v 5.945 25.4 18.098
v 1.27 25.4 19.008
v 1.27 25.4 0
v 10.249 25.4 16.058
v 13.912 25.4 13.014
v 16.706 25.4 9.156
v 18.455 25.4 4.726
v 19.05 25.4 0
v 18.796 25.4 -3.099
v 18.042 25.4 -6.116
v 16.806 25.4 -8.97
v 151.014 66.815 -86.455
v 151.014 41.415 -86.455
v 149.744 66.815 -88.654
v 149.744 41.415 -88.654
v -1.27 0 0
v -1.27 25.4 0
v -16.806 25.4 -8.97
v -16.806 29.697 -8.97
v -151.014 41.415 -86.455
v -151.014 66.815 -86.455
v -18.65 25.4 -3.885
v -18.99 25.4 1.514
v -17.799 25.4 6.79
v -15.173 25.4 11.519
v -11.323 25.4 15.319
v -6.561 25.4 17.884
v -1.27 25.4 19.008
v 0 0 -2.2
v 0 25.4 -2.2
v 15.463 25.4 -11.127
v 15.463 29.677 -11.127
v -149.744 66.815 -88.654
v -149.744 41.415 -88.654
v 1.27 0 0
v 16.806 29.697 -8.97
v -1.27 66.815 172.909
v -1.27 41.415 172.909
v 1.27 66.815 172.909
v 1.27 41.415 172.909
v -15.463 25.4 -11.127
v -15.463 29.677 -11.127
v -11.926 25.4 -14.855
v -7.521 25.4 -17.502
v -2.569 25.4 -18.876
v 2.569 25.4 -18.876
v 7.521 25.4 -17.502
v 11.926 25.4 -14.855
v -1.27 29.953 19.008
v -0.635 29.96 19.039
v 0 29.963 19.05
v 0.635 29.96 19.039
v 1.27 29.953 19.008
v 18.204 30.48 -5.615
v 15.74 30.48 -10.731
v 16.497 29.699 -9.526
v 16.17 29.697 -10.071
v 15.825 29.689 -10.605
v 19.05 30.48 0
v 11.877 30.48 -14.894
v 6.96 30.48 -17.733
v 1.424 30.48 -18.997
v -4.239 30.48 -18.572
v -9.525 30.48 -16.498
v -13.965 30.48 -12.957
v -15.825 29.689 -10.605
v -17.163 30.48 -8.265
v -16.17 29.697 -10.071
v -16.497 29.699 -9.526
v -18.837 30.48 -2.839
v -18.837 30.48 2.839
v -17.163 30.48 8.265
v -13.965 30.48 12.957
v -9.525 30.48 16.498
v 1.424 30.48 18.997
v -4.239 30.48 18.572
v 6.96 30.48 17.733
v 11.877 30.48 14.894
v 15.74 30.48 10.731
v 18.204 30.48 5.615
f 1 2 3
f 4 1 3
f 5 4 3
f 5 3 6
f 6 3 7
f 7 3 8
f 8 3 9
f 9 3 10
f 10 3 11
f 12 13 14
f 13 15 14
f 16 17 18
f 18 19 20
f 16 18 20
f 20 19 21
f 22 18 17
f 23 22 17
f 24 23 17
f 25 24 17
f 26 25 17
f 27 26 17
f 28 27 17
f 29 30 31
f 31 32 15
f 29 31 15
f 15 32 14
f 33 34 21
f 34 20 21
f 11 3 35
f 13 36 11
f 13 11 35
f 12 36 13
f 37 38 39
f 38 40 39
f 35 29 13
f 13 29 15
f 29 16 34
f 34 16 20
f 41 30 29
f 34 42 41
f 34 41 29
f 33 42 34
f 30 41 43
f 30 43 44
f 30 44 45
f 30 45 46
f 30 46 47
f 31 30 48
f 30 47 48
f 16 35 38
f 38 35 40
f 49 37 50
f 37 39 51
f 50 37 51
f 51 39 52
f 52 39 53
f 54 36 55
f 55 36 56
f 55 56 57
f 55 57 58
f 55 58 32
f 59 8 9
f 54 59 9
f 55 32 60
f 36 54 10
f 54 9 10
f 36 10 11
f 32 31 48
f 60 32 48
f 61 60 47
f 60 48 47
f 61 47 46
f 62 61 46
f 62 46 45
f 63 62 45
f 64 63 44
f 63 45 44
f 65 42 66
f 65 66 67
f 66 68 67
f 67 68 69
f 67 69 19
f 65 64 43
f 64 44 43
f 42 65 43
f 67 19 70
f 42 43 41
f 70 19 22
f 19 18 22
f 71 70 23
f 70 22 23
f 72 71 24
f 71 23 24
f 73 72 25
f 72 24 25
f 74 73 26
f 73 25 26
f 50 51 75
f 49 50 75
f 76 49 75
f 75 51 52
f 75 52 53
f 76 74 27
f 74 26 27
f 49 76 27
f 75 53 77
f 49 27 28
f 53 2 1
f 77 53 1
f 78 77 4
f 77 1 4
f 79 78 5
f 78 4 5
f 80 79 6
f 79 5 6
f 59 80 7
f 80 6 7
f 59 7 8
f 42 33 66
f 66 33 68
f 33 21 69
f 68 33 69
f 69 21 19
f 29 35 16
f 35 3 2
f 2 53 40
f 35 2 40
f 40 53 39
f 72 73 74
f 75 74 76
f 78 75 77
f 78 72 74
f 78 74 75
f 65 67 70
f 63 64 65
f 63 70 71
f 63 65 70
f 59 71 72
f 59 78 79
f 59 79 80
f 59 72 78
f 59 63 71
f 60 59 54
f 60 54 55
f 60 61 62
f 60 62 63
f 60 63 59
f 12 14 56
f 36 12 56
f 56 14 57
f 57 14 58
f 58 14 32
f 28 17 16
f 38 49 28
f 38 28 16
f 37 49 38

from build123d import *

# Parameters (mm, degrees)
BOSS_EXTRUDE1_DEPTH = 25.4
BOSS_EXTRUDE2_DEPTH = 1.27
CIRPATTERN3_COUNT   = 3
SKETCH3_R           = 19.05
BOSS_EXTRUDE3_DEPTH = 5.08


with BuildPart() as part:
    # Sketch1 → Boss-Extrude1 (new body)
    with BuildSketch(Plane(origin=(0, 0, 0), x_dir=(1, 0, 0), z_dir=(0, 1, 0))):
        Polygon((-1.27, 0), (0, 2.199704526), (1.27, 0), align=None)
    extrude(amount=BOSS_EXTRUDE1_DEPTH)

    # Sketch2 → Boss-Extrude2 (add, symmetric)
    with BuildSketch(Plane(origin=(0, 0, 0), x_dir=(0, 0, -1), z_dir=(1, 0, 0))):
        Polygon((0, 0), (-172.909241249, 41.415387125), (-172.909241249, 66.815387125), (0, 25.4), align=None)
    boss_extrude2 = extrude(amount=BOSS_EXTRUDE2_DEPTH, both=True)

    # CirPattern3: Boss-Extrude2 ×3 about axis
    cirpattern3_axis = Axis((0, 25.4, -0.733234842), (0, 1, 0))
    for i in range(1, CIRPATTERN3_COUNT):
        add(boss_extrude2.rotate(cirpattern3_axis, i * 360 / CIRPATTERN3_COUNT))

    # Sketch3 → Boss-Extrude3 (add)
    with BuildSketch(Plane(origin=(0, 25.4, 0), x_dir=(1, 0, 0), z_dir=(0, 1, 0))):
        Circle(SKETCH3_R)
    extrude(amount=BOSS_EXTRUDE3_DEPTH)


solid = part.part
